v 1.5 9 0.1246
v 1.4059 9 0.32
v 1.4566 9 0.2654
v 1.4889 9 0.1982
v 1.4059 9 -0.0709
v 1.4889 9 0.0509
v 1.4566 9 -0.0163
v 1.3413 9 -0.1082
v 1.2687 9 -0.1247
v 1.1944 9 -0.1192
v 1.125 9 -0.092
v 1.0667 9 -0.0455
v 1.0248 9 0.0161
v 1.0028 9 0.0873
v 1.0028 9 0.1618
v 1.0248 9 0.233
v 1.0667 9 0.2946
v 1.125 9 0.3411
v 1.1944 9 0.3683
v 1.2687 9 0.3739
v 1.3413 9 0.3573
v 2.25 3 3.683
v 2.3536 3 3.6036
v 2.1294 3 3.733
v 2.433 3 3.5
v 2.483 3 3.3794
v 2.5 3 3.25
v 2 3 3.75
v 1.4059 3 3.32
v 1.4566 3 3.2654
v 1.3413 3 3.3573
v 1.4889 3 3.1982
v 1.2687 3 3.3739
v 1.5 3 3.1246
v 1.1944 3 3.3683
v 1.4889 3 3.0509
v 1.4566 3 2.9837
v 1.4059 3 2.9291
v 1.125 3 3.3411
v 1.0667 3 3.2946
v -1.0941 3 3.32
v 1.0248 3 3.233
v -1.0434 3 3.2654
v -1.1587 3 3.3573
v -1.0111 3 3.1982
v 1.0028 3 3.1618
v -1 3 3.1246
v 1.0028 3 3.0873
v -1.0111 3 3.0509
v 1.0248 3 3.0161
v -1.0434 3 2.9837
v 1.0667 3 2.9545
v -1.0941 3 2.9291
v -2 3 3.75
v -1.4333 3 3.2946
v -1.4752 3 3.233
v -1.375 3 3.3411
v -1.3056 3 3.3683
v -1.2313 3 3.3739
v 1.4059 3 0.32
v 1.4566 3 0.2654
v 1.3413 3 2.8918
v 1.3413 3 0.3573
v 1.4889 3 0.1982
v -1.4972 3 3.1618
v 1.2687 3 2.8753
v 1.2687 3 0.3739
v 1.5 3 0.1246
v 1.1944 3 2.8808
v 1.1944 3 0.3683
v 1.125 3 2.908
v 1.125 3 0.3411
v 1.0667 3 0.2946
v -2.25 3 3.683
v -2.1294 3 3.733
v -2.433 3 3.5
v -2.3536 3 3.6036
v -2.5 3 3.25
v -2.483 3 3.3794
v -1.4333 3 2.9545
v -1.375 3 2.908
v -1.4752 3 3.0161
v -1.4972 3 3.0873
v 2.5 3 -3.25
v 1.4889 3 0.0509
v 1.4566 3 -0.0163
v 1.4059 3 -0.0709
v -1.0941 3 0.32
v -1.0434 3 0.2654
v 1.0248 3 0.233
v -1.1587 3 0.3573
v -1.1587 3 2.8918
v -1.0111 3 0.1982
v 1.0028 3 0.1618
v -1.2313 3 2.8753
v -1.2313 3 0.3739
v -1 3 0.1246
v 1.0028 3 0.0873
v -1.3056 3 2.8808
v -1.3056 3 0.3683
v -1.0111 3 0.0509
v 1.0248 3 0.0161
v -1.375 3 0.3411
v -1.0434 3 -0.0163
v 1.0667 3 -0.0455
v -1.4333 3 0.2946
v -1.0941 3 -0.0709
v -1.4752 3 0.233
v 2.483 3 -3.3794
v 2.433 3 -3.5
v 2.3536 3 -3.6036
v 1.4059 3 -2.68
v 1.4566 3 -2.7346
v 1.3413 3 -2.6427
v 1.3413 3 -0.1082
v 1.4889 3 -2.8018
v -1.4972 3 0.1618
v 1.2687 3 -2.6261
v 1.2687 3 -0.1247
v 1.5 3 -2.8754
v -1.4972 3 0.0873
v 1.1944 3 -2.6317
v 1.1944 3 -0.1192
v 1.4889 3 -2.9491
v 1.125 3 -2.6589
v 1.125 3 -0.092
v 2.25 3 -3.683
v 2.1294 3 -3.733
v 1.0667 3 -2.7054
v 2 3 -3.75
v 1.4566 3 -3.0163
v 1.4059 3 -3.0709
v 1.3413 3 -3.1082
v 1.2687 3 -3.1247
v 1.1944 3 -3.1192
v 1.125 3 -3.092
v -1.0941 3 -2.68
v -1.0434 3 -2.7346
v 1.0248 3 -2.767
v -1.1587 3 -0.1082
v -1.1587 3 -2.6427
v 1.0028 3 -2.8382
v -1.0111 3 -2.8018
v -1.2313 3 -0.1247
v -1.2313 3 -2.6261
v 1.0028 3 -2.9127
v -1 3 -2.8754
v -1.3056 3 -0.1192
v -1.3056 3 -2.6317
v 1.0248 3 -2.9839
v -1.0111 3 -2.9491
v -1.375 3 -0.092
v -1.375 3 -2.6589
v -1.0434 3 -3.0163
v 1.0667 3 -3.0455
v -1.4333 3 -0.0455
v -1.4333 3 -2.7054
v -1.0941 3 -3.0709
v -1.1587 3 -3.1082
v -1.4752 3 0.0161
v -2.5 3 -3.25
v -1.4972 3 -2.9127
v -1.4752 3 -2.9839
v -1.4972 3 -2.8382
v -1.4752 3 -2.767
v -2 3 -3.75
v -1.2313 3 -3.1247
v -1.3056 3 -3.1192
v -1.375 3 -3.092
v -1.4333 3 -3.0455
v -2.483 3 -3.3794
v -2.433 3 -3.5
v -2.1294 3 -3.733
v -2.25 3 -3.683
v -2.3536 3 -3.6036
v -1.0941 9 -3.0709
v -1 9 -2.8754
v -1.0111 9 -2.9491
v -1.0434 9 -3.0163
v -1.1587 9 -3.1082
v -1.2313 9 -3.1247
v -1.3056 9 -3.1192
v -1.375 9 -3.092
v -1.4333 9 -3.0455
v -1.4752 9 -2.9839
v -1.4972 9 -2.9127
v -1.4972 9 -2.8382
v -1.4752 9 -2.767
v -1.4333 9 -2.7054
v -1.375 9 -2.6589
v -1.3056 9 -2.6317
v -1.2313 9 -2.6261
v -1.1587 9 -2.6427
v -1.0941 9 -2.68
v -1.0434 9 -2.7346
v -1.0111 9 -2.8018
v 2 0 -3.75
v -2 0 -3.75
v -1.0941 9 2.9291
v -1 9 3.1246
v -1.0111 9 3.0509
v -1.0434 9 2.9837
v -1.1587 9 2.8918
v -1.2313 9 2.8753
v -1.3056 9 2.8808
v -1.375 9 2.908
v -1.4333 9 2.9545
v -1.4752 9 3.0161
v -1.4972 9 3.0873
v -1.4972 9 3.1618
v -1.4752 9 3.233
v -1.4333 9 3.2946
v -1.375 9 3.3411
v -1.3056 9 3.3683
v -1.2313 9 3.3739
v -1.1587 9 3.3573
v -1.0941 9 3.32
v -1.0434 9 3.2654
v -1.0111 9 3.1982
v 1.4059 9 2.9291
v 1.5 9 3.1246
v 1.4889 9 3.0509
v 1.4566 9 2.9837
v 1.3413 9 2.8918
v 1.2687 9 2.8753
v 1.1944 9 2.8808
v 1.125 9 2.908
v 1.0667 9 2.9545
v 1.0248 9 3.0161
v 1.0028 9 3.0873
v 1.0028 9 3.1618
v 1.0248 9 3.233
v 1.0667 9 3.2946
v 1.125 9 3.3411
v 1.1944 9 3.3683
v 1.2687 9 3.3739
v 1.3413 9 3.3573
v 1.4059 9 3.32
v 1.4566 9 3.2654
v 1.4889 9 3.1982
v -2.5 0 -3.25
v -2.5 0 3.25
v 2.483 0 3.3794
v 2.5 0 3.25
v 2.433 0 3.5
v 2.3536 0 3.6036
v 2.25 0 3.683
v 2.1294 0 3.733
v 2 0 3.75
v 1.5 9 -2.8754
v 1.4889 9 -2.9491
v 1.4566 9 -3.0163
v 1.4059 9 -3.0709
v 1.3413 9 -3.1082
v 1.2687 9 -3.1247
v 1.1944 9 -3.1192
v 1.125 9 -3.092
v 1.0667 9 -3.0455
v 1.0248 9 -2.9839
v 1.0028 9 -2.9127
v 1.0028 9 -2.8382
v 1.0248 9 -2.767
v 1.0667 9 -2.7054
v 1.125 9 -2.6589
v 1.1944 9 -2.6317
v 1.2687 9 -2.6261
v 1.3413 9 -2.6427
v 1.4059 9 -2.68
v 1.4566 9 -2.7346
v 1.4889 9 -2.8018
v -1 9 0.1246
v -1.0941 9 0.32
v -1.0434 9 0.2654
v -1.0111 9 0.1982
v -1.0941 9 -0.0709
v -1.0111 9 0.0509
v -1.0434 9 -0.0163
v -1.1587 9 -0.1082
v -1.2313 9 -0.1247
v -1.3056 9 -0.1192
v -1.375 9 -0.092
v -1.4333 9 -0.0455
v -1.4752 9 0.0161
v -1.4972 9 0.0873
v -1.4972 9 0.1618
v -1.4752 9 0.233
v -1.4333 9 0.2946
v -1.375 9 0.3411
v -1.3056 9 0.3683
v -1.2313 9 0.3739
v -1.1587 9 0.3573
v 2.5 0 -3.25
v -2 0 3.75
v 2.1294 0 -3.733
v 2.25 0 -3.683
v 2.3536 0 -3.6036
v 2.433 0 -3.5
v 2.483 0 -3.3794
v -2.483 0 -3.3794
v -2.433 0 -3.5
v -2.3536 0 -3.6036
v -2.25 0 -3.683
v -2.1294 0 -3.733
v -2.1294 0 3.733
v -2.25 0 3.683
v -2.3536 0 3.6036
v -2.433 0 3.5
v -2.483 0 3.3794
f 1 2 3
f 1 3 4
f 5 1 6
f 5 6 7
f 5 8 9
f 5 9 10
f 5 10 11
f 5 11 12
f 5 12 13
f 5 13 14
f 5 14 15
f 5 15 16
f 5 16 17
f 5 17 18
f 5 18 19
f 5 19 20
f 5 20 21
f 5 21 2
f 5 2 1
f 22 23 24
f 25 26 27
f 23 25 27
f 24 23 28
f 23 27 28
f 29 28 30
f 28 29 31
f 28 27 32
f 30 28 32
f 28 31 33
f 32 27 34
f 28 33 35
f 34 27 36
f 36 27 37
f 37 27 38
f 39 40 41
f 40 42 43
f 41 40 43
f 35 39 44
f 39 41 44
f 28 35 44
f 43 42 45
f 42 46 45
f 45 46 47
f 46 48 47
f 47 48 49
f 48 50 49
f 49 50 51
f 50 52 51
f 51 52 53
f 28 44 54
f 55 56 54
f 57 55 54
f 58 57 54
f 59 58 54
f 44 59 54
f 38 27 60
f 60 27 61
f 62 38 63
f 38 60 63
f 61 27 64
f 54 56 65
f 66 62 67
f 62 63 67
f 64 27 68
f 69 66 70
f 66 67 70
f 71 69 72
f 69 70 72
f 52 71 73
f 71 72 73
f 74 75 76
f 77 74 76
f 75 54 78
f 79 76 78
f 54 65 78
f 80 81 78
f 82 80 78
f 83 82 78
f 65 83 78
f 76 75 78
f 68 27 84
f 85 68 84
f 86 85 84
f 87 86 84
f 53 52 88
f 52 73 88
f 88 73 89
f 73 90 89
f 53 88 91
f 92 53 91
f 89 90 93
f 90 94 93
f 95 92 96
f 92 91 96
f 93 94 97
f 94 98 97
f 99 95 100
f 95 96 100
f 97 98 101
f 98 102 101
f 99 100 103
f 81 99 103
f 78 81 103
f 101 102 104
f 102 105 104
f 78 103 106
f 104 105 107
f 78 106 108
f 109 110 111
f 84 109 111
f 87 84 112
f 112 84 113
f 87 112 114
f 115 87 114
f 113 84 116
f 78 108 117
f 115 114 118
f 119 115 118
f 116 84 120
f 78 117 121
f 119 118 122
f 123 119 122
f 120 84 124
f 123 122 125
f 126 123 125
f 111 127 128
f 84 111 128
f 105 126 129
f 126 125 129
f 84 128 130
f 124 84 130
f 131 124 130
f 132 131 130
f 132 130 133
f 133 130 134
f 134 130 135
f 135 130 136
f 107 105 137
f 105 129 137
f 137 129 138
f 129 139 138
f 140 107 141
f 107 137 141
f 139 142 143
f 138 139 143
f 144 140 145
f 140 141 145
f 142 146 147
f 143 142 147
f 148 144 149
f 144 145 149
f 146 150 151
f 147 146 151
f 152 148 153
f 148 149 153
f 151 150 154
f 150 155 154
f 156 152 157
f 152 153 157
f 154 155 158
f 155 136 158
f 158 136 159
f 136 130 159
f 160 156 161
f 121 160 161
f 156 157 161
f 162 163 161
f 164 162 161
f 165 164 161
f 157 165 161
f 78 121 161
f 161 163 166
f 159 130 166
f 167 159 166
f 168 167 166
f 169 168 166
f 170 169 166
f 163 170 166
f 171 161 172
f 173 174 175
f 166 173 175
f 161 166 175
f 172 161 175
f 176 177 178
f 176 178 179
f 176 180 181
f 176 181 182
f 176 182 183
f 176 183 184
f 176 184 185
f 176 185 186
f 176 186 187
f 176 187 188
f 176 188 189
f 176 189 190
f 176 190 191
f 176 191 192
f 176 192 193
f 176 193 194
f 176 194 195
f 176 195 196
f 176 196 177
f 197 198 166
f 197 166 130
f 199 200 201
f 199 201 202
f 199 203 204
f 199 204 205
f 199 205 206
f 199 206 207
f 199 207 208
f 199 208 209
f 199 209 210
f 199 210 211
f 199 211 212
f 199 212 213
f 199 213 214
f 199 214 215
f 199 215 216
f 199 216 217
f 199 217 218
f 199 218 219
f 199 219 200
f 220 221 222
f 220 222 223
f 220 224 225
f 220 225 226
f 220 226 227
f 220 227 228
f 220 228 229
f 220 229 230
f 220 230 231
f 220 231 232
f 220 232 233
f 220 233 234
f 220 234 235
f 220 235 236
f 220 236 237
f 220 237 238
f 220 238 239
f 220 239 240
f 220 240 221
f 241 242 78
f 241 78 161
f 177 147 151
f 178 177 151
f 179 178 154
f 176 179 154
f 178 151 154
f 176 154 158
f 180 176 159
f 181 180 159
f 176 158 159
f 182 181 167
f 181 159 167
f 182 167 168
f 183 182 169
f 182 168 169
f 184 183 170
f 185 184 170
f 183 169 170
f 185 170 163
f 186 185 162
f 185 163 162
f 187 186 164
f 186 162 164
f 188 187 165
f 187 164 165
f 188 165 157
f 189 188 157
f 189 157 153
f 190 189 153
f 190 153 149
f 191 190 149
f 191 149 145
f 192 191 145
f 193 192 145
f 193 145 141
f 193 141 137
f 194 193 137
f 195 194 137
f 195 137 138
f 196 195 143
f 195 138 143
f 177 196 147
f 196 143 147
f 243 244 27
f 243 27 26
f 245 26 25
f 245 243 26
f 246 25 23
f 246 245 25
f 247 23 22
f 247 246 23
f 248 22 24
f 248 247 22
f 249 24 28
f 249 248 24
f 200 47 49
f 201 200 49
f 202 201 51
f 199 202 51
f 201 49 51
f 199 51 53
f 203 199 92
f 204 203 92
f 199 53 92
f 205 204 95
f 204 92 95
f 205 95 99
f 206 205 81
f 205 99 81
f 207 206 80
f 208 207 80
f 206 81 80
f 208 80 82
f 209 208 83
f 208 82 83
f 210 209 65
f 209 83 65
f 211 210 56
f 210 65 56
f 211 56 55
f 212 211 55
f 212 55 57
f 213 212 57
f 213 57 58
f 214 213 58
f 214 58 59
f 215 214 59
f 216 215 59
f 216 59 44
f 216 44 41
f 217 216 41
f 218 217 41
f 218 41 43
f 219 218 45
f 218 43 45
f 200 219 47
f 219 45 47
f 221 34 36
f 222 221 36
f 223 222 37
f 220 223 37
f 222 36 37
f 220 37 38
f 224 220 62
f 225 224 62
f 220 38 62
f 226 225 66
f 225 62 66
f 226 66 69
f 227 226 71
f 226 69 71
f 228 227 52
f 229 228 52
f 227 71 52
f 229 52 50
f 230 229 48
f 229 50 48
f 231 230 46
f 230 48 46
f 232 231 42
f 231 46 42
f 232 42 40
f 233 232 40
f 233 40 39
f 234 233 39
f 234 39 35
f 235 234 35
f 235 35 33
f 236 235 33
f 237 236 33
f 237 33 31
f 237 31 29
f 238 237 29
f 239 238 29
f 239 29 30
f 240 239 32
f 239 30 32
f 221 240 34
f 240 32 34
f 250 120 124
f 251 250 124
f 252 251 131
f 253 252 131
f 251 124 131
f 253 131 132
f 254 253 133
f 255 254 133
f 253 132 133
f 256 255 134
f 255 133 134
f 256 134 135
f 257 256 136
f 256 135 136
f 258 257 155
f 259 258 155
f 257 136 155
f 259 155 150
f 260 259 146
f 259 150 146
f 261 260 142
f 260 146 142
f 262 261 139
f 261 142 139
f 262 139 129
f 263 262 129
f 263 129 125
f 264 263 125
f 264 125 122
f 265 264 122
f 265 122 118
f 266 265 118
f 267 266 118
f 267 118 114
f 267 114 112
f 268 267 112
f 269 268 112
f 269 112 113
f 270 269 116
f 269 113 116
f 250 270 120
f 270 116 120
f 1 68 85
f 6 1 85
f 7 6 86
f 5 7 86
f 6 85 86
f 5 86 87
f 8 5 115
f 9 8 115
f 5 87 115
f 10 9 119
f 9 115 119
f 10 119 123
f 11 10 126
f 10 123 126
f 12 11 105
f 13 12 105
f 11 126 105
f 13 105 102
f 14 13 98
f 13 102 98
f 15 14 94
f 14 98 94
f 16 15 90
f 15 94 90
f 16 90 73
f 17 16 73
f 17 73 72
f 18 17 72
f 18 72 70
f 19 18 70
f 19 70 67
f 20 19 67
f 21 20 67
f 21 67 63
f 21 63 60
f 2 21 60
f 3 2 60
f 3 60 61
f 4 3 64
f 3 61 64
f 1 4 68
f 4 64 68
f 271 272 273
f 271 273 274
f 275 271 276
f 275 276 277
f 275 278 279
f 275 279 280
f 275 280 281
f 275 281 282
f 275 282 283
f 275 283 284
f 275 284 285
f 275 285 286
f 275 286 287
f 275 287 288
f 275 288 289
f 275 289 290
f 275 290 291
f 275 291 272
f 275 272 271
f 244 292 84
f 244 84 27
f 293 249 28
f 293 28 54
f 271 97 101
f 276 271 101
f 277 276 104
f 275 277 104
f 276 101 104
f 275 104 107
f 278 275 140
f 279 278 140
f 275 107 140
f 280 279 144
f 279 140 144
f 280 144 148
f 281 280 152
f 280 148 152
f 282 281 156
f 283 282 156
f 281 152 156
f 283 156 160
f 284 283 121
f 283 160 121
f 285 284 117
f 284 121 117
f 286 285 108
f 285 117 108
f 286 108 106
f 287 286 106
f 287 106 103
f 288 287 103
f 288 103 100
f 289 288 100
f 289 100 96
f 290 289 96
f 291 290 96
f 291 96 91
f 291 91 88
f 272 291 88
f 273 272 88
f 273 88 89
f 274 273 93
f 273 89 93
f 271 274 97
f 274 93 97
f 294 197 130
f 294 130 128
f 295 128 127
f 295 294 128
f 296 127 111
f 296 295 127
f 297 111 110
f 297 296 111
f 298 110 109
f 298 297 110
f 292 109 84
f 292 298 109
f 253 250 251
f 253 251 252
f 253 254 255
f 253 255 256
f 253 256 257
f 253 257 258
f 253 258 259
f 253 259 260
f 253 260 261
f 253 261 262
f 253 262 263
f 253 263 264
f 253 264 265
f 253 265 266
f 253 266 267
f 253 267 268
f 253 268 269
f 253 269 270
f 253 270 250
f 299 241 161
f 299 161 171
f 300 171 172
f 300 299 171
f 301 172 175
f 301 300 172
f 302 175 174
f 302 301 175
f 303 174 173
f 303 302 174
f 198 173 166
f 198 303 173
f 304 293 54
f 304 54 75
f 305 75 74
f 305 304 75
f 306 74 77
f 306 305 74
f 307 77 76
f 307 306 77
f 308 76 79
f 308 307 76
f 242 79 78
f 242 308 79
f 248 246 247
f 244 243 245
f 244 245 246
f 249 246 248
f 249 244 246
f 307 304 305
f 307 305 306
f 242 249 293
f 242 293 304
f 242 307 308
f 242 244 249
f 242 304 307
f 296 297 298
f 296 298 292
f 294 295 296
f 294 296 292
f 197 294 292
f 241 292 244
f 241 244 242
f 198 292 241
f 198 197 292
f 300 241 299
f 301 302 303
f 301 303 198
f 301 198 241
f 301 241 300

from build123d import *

# Parameters (mm, degrees)
BOSS_EXTRUDE1_DEPTH = 3
SKETCH2_R           = 0.25
BOSS_EXTRUDE2_DEPTH = 6


with BuildPart() as part:
    # Sketch1 → Boss-Extrude1 (new body)
    with BuildSketch(Plane(origin=(0, 0, 0), x_dir=(1, 0, 0), z_dir=(0, 1, 0))):
        with BuildLine():
            Line((-2, 3.75), (2, 3.75))
            ThreePointArc((2, 3.75), (2.353553391, 3.603553391), (2.5, 3.25))
            Line((2.5, 3.25), (2.5, -3.25))
            ThreePointArc((2.5, -3.25), (2.353553391, -3.603553391), (2, -3.75))
            Line((2, -3.75), (-2, -3.75))
            ThreePointArc((-2, -3.75), (-2.353553391, -3.603553391), (-2.5, -3.25))
            Line((-2.5, -3.25), (-2.5, 3.25))
            ThreePointArc((-2.5, 3.25), (-2.353553391, 3.603553391), (-2, 3.75))
        make_face()
    extrude(amount=BOSS_EXTRUDE1_DEPTH)

    # Sketch2 → Boss-Extrude2 (add)
    with BuildSketch(Plane(origin=(0, 3, 0), x_dir=(1, 0, 0), z_dir=(0, 1, 0))):
        with Locations((-1.25, 2.875448281)):
            Circle(SKETCH2_R)
        with Locations((1.25, 2.875448281)):
            Circle(SKETCH2_R)
        with Locations((-1.25, -0.124551719)):
            Circle(SKETCH2_R)
        with Locations((1.25, -0.124551719)):
            Circle(SKETCH2_R)
        with Locations((-1.25, -3.124551719)):
            Circle(SKETCH2_R)
        with Locations((1.25, -3.124551719)):
            Circle(SKETCH2_R)
    extrude(amount=BOSS_EXTRUDE2_DEPTH)


solid = part.part
